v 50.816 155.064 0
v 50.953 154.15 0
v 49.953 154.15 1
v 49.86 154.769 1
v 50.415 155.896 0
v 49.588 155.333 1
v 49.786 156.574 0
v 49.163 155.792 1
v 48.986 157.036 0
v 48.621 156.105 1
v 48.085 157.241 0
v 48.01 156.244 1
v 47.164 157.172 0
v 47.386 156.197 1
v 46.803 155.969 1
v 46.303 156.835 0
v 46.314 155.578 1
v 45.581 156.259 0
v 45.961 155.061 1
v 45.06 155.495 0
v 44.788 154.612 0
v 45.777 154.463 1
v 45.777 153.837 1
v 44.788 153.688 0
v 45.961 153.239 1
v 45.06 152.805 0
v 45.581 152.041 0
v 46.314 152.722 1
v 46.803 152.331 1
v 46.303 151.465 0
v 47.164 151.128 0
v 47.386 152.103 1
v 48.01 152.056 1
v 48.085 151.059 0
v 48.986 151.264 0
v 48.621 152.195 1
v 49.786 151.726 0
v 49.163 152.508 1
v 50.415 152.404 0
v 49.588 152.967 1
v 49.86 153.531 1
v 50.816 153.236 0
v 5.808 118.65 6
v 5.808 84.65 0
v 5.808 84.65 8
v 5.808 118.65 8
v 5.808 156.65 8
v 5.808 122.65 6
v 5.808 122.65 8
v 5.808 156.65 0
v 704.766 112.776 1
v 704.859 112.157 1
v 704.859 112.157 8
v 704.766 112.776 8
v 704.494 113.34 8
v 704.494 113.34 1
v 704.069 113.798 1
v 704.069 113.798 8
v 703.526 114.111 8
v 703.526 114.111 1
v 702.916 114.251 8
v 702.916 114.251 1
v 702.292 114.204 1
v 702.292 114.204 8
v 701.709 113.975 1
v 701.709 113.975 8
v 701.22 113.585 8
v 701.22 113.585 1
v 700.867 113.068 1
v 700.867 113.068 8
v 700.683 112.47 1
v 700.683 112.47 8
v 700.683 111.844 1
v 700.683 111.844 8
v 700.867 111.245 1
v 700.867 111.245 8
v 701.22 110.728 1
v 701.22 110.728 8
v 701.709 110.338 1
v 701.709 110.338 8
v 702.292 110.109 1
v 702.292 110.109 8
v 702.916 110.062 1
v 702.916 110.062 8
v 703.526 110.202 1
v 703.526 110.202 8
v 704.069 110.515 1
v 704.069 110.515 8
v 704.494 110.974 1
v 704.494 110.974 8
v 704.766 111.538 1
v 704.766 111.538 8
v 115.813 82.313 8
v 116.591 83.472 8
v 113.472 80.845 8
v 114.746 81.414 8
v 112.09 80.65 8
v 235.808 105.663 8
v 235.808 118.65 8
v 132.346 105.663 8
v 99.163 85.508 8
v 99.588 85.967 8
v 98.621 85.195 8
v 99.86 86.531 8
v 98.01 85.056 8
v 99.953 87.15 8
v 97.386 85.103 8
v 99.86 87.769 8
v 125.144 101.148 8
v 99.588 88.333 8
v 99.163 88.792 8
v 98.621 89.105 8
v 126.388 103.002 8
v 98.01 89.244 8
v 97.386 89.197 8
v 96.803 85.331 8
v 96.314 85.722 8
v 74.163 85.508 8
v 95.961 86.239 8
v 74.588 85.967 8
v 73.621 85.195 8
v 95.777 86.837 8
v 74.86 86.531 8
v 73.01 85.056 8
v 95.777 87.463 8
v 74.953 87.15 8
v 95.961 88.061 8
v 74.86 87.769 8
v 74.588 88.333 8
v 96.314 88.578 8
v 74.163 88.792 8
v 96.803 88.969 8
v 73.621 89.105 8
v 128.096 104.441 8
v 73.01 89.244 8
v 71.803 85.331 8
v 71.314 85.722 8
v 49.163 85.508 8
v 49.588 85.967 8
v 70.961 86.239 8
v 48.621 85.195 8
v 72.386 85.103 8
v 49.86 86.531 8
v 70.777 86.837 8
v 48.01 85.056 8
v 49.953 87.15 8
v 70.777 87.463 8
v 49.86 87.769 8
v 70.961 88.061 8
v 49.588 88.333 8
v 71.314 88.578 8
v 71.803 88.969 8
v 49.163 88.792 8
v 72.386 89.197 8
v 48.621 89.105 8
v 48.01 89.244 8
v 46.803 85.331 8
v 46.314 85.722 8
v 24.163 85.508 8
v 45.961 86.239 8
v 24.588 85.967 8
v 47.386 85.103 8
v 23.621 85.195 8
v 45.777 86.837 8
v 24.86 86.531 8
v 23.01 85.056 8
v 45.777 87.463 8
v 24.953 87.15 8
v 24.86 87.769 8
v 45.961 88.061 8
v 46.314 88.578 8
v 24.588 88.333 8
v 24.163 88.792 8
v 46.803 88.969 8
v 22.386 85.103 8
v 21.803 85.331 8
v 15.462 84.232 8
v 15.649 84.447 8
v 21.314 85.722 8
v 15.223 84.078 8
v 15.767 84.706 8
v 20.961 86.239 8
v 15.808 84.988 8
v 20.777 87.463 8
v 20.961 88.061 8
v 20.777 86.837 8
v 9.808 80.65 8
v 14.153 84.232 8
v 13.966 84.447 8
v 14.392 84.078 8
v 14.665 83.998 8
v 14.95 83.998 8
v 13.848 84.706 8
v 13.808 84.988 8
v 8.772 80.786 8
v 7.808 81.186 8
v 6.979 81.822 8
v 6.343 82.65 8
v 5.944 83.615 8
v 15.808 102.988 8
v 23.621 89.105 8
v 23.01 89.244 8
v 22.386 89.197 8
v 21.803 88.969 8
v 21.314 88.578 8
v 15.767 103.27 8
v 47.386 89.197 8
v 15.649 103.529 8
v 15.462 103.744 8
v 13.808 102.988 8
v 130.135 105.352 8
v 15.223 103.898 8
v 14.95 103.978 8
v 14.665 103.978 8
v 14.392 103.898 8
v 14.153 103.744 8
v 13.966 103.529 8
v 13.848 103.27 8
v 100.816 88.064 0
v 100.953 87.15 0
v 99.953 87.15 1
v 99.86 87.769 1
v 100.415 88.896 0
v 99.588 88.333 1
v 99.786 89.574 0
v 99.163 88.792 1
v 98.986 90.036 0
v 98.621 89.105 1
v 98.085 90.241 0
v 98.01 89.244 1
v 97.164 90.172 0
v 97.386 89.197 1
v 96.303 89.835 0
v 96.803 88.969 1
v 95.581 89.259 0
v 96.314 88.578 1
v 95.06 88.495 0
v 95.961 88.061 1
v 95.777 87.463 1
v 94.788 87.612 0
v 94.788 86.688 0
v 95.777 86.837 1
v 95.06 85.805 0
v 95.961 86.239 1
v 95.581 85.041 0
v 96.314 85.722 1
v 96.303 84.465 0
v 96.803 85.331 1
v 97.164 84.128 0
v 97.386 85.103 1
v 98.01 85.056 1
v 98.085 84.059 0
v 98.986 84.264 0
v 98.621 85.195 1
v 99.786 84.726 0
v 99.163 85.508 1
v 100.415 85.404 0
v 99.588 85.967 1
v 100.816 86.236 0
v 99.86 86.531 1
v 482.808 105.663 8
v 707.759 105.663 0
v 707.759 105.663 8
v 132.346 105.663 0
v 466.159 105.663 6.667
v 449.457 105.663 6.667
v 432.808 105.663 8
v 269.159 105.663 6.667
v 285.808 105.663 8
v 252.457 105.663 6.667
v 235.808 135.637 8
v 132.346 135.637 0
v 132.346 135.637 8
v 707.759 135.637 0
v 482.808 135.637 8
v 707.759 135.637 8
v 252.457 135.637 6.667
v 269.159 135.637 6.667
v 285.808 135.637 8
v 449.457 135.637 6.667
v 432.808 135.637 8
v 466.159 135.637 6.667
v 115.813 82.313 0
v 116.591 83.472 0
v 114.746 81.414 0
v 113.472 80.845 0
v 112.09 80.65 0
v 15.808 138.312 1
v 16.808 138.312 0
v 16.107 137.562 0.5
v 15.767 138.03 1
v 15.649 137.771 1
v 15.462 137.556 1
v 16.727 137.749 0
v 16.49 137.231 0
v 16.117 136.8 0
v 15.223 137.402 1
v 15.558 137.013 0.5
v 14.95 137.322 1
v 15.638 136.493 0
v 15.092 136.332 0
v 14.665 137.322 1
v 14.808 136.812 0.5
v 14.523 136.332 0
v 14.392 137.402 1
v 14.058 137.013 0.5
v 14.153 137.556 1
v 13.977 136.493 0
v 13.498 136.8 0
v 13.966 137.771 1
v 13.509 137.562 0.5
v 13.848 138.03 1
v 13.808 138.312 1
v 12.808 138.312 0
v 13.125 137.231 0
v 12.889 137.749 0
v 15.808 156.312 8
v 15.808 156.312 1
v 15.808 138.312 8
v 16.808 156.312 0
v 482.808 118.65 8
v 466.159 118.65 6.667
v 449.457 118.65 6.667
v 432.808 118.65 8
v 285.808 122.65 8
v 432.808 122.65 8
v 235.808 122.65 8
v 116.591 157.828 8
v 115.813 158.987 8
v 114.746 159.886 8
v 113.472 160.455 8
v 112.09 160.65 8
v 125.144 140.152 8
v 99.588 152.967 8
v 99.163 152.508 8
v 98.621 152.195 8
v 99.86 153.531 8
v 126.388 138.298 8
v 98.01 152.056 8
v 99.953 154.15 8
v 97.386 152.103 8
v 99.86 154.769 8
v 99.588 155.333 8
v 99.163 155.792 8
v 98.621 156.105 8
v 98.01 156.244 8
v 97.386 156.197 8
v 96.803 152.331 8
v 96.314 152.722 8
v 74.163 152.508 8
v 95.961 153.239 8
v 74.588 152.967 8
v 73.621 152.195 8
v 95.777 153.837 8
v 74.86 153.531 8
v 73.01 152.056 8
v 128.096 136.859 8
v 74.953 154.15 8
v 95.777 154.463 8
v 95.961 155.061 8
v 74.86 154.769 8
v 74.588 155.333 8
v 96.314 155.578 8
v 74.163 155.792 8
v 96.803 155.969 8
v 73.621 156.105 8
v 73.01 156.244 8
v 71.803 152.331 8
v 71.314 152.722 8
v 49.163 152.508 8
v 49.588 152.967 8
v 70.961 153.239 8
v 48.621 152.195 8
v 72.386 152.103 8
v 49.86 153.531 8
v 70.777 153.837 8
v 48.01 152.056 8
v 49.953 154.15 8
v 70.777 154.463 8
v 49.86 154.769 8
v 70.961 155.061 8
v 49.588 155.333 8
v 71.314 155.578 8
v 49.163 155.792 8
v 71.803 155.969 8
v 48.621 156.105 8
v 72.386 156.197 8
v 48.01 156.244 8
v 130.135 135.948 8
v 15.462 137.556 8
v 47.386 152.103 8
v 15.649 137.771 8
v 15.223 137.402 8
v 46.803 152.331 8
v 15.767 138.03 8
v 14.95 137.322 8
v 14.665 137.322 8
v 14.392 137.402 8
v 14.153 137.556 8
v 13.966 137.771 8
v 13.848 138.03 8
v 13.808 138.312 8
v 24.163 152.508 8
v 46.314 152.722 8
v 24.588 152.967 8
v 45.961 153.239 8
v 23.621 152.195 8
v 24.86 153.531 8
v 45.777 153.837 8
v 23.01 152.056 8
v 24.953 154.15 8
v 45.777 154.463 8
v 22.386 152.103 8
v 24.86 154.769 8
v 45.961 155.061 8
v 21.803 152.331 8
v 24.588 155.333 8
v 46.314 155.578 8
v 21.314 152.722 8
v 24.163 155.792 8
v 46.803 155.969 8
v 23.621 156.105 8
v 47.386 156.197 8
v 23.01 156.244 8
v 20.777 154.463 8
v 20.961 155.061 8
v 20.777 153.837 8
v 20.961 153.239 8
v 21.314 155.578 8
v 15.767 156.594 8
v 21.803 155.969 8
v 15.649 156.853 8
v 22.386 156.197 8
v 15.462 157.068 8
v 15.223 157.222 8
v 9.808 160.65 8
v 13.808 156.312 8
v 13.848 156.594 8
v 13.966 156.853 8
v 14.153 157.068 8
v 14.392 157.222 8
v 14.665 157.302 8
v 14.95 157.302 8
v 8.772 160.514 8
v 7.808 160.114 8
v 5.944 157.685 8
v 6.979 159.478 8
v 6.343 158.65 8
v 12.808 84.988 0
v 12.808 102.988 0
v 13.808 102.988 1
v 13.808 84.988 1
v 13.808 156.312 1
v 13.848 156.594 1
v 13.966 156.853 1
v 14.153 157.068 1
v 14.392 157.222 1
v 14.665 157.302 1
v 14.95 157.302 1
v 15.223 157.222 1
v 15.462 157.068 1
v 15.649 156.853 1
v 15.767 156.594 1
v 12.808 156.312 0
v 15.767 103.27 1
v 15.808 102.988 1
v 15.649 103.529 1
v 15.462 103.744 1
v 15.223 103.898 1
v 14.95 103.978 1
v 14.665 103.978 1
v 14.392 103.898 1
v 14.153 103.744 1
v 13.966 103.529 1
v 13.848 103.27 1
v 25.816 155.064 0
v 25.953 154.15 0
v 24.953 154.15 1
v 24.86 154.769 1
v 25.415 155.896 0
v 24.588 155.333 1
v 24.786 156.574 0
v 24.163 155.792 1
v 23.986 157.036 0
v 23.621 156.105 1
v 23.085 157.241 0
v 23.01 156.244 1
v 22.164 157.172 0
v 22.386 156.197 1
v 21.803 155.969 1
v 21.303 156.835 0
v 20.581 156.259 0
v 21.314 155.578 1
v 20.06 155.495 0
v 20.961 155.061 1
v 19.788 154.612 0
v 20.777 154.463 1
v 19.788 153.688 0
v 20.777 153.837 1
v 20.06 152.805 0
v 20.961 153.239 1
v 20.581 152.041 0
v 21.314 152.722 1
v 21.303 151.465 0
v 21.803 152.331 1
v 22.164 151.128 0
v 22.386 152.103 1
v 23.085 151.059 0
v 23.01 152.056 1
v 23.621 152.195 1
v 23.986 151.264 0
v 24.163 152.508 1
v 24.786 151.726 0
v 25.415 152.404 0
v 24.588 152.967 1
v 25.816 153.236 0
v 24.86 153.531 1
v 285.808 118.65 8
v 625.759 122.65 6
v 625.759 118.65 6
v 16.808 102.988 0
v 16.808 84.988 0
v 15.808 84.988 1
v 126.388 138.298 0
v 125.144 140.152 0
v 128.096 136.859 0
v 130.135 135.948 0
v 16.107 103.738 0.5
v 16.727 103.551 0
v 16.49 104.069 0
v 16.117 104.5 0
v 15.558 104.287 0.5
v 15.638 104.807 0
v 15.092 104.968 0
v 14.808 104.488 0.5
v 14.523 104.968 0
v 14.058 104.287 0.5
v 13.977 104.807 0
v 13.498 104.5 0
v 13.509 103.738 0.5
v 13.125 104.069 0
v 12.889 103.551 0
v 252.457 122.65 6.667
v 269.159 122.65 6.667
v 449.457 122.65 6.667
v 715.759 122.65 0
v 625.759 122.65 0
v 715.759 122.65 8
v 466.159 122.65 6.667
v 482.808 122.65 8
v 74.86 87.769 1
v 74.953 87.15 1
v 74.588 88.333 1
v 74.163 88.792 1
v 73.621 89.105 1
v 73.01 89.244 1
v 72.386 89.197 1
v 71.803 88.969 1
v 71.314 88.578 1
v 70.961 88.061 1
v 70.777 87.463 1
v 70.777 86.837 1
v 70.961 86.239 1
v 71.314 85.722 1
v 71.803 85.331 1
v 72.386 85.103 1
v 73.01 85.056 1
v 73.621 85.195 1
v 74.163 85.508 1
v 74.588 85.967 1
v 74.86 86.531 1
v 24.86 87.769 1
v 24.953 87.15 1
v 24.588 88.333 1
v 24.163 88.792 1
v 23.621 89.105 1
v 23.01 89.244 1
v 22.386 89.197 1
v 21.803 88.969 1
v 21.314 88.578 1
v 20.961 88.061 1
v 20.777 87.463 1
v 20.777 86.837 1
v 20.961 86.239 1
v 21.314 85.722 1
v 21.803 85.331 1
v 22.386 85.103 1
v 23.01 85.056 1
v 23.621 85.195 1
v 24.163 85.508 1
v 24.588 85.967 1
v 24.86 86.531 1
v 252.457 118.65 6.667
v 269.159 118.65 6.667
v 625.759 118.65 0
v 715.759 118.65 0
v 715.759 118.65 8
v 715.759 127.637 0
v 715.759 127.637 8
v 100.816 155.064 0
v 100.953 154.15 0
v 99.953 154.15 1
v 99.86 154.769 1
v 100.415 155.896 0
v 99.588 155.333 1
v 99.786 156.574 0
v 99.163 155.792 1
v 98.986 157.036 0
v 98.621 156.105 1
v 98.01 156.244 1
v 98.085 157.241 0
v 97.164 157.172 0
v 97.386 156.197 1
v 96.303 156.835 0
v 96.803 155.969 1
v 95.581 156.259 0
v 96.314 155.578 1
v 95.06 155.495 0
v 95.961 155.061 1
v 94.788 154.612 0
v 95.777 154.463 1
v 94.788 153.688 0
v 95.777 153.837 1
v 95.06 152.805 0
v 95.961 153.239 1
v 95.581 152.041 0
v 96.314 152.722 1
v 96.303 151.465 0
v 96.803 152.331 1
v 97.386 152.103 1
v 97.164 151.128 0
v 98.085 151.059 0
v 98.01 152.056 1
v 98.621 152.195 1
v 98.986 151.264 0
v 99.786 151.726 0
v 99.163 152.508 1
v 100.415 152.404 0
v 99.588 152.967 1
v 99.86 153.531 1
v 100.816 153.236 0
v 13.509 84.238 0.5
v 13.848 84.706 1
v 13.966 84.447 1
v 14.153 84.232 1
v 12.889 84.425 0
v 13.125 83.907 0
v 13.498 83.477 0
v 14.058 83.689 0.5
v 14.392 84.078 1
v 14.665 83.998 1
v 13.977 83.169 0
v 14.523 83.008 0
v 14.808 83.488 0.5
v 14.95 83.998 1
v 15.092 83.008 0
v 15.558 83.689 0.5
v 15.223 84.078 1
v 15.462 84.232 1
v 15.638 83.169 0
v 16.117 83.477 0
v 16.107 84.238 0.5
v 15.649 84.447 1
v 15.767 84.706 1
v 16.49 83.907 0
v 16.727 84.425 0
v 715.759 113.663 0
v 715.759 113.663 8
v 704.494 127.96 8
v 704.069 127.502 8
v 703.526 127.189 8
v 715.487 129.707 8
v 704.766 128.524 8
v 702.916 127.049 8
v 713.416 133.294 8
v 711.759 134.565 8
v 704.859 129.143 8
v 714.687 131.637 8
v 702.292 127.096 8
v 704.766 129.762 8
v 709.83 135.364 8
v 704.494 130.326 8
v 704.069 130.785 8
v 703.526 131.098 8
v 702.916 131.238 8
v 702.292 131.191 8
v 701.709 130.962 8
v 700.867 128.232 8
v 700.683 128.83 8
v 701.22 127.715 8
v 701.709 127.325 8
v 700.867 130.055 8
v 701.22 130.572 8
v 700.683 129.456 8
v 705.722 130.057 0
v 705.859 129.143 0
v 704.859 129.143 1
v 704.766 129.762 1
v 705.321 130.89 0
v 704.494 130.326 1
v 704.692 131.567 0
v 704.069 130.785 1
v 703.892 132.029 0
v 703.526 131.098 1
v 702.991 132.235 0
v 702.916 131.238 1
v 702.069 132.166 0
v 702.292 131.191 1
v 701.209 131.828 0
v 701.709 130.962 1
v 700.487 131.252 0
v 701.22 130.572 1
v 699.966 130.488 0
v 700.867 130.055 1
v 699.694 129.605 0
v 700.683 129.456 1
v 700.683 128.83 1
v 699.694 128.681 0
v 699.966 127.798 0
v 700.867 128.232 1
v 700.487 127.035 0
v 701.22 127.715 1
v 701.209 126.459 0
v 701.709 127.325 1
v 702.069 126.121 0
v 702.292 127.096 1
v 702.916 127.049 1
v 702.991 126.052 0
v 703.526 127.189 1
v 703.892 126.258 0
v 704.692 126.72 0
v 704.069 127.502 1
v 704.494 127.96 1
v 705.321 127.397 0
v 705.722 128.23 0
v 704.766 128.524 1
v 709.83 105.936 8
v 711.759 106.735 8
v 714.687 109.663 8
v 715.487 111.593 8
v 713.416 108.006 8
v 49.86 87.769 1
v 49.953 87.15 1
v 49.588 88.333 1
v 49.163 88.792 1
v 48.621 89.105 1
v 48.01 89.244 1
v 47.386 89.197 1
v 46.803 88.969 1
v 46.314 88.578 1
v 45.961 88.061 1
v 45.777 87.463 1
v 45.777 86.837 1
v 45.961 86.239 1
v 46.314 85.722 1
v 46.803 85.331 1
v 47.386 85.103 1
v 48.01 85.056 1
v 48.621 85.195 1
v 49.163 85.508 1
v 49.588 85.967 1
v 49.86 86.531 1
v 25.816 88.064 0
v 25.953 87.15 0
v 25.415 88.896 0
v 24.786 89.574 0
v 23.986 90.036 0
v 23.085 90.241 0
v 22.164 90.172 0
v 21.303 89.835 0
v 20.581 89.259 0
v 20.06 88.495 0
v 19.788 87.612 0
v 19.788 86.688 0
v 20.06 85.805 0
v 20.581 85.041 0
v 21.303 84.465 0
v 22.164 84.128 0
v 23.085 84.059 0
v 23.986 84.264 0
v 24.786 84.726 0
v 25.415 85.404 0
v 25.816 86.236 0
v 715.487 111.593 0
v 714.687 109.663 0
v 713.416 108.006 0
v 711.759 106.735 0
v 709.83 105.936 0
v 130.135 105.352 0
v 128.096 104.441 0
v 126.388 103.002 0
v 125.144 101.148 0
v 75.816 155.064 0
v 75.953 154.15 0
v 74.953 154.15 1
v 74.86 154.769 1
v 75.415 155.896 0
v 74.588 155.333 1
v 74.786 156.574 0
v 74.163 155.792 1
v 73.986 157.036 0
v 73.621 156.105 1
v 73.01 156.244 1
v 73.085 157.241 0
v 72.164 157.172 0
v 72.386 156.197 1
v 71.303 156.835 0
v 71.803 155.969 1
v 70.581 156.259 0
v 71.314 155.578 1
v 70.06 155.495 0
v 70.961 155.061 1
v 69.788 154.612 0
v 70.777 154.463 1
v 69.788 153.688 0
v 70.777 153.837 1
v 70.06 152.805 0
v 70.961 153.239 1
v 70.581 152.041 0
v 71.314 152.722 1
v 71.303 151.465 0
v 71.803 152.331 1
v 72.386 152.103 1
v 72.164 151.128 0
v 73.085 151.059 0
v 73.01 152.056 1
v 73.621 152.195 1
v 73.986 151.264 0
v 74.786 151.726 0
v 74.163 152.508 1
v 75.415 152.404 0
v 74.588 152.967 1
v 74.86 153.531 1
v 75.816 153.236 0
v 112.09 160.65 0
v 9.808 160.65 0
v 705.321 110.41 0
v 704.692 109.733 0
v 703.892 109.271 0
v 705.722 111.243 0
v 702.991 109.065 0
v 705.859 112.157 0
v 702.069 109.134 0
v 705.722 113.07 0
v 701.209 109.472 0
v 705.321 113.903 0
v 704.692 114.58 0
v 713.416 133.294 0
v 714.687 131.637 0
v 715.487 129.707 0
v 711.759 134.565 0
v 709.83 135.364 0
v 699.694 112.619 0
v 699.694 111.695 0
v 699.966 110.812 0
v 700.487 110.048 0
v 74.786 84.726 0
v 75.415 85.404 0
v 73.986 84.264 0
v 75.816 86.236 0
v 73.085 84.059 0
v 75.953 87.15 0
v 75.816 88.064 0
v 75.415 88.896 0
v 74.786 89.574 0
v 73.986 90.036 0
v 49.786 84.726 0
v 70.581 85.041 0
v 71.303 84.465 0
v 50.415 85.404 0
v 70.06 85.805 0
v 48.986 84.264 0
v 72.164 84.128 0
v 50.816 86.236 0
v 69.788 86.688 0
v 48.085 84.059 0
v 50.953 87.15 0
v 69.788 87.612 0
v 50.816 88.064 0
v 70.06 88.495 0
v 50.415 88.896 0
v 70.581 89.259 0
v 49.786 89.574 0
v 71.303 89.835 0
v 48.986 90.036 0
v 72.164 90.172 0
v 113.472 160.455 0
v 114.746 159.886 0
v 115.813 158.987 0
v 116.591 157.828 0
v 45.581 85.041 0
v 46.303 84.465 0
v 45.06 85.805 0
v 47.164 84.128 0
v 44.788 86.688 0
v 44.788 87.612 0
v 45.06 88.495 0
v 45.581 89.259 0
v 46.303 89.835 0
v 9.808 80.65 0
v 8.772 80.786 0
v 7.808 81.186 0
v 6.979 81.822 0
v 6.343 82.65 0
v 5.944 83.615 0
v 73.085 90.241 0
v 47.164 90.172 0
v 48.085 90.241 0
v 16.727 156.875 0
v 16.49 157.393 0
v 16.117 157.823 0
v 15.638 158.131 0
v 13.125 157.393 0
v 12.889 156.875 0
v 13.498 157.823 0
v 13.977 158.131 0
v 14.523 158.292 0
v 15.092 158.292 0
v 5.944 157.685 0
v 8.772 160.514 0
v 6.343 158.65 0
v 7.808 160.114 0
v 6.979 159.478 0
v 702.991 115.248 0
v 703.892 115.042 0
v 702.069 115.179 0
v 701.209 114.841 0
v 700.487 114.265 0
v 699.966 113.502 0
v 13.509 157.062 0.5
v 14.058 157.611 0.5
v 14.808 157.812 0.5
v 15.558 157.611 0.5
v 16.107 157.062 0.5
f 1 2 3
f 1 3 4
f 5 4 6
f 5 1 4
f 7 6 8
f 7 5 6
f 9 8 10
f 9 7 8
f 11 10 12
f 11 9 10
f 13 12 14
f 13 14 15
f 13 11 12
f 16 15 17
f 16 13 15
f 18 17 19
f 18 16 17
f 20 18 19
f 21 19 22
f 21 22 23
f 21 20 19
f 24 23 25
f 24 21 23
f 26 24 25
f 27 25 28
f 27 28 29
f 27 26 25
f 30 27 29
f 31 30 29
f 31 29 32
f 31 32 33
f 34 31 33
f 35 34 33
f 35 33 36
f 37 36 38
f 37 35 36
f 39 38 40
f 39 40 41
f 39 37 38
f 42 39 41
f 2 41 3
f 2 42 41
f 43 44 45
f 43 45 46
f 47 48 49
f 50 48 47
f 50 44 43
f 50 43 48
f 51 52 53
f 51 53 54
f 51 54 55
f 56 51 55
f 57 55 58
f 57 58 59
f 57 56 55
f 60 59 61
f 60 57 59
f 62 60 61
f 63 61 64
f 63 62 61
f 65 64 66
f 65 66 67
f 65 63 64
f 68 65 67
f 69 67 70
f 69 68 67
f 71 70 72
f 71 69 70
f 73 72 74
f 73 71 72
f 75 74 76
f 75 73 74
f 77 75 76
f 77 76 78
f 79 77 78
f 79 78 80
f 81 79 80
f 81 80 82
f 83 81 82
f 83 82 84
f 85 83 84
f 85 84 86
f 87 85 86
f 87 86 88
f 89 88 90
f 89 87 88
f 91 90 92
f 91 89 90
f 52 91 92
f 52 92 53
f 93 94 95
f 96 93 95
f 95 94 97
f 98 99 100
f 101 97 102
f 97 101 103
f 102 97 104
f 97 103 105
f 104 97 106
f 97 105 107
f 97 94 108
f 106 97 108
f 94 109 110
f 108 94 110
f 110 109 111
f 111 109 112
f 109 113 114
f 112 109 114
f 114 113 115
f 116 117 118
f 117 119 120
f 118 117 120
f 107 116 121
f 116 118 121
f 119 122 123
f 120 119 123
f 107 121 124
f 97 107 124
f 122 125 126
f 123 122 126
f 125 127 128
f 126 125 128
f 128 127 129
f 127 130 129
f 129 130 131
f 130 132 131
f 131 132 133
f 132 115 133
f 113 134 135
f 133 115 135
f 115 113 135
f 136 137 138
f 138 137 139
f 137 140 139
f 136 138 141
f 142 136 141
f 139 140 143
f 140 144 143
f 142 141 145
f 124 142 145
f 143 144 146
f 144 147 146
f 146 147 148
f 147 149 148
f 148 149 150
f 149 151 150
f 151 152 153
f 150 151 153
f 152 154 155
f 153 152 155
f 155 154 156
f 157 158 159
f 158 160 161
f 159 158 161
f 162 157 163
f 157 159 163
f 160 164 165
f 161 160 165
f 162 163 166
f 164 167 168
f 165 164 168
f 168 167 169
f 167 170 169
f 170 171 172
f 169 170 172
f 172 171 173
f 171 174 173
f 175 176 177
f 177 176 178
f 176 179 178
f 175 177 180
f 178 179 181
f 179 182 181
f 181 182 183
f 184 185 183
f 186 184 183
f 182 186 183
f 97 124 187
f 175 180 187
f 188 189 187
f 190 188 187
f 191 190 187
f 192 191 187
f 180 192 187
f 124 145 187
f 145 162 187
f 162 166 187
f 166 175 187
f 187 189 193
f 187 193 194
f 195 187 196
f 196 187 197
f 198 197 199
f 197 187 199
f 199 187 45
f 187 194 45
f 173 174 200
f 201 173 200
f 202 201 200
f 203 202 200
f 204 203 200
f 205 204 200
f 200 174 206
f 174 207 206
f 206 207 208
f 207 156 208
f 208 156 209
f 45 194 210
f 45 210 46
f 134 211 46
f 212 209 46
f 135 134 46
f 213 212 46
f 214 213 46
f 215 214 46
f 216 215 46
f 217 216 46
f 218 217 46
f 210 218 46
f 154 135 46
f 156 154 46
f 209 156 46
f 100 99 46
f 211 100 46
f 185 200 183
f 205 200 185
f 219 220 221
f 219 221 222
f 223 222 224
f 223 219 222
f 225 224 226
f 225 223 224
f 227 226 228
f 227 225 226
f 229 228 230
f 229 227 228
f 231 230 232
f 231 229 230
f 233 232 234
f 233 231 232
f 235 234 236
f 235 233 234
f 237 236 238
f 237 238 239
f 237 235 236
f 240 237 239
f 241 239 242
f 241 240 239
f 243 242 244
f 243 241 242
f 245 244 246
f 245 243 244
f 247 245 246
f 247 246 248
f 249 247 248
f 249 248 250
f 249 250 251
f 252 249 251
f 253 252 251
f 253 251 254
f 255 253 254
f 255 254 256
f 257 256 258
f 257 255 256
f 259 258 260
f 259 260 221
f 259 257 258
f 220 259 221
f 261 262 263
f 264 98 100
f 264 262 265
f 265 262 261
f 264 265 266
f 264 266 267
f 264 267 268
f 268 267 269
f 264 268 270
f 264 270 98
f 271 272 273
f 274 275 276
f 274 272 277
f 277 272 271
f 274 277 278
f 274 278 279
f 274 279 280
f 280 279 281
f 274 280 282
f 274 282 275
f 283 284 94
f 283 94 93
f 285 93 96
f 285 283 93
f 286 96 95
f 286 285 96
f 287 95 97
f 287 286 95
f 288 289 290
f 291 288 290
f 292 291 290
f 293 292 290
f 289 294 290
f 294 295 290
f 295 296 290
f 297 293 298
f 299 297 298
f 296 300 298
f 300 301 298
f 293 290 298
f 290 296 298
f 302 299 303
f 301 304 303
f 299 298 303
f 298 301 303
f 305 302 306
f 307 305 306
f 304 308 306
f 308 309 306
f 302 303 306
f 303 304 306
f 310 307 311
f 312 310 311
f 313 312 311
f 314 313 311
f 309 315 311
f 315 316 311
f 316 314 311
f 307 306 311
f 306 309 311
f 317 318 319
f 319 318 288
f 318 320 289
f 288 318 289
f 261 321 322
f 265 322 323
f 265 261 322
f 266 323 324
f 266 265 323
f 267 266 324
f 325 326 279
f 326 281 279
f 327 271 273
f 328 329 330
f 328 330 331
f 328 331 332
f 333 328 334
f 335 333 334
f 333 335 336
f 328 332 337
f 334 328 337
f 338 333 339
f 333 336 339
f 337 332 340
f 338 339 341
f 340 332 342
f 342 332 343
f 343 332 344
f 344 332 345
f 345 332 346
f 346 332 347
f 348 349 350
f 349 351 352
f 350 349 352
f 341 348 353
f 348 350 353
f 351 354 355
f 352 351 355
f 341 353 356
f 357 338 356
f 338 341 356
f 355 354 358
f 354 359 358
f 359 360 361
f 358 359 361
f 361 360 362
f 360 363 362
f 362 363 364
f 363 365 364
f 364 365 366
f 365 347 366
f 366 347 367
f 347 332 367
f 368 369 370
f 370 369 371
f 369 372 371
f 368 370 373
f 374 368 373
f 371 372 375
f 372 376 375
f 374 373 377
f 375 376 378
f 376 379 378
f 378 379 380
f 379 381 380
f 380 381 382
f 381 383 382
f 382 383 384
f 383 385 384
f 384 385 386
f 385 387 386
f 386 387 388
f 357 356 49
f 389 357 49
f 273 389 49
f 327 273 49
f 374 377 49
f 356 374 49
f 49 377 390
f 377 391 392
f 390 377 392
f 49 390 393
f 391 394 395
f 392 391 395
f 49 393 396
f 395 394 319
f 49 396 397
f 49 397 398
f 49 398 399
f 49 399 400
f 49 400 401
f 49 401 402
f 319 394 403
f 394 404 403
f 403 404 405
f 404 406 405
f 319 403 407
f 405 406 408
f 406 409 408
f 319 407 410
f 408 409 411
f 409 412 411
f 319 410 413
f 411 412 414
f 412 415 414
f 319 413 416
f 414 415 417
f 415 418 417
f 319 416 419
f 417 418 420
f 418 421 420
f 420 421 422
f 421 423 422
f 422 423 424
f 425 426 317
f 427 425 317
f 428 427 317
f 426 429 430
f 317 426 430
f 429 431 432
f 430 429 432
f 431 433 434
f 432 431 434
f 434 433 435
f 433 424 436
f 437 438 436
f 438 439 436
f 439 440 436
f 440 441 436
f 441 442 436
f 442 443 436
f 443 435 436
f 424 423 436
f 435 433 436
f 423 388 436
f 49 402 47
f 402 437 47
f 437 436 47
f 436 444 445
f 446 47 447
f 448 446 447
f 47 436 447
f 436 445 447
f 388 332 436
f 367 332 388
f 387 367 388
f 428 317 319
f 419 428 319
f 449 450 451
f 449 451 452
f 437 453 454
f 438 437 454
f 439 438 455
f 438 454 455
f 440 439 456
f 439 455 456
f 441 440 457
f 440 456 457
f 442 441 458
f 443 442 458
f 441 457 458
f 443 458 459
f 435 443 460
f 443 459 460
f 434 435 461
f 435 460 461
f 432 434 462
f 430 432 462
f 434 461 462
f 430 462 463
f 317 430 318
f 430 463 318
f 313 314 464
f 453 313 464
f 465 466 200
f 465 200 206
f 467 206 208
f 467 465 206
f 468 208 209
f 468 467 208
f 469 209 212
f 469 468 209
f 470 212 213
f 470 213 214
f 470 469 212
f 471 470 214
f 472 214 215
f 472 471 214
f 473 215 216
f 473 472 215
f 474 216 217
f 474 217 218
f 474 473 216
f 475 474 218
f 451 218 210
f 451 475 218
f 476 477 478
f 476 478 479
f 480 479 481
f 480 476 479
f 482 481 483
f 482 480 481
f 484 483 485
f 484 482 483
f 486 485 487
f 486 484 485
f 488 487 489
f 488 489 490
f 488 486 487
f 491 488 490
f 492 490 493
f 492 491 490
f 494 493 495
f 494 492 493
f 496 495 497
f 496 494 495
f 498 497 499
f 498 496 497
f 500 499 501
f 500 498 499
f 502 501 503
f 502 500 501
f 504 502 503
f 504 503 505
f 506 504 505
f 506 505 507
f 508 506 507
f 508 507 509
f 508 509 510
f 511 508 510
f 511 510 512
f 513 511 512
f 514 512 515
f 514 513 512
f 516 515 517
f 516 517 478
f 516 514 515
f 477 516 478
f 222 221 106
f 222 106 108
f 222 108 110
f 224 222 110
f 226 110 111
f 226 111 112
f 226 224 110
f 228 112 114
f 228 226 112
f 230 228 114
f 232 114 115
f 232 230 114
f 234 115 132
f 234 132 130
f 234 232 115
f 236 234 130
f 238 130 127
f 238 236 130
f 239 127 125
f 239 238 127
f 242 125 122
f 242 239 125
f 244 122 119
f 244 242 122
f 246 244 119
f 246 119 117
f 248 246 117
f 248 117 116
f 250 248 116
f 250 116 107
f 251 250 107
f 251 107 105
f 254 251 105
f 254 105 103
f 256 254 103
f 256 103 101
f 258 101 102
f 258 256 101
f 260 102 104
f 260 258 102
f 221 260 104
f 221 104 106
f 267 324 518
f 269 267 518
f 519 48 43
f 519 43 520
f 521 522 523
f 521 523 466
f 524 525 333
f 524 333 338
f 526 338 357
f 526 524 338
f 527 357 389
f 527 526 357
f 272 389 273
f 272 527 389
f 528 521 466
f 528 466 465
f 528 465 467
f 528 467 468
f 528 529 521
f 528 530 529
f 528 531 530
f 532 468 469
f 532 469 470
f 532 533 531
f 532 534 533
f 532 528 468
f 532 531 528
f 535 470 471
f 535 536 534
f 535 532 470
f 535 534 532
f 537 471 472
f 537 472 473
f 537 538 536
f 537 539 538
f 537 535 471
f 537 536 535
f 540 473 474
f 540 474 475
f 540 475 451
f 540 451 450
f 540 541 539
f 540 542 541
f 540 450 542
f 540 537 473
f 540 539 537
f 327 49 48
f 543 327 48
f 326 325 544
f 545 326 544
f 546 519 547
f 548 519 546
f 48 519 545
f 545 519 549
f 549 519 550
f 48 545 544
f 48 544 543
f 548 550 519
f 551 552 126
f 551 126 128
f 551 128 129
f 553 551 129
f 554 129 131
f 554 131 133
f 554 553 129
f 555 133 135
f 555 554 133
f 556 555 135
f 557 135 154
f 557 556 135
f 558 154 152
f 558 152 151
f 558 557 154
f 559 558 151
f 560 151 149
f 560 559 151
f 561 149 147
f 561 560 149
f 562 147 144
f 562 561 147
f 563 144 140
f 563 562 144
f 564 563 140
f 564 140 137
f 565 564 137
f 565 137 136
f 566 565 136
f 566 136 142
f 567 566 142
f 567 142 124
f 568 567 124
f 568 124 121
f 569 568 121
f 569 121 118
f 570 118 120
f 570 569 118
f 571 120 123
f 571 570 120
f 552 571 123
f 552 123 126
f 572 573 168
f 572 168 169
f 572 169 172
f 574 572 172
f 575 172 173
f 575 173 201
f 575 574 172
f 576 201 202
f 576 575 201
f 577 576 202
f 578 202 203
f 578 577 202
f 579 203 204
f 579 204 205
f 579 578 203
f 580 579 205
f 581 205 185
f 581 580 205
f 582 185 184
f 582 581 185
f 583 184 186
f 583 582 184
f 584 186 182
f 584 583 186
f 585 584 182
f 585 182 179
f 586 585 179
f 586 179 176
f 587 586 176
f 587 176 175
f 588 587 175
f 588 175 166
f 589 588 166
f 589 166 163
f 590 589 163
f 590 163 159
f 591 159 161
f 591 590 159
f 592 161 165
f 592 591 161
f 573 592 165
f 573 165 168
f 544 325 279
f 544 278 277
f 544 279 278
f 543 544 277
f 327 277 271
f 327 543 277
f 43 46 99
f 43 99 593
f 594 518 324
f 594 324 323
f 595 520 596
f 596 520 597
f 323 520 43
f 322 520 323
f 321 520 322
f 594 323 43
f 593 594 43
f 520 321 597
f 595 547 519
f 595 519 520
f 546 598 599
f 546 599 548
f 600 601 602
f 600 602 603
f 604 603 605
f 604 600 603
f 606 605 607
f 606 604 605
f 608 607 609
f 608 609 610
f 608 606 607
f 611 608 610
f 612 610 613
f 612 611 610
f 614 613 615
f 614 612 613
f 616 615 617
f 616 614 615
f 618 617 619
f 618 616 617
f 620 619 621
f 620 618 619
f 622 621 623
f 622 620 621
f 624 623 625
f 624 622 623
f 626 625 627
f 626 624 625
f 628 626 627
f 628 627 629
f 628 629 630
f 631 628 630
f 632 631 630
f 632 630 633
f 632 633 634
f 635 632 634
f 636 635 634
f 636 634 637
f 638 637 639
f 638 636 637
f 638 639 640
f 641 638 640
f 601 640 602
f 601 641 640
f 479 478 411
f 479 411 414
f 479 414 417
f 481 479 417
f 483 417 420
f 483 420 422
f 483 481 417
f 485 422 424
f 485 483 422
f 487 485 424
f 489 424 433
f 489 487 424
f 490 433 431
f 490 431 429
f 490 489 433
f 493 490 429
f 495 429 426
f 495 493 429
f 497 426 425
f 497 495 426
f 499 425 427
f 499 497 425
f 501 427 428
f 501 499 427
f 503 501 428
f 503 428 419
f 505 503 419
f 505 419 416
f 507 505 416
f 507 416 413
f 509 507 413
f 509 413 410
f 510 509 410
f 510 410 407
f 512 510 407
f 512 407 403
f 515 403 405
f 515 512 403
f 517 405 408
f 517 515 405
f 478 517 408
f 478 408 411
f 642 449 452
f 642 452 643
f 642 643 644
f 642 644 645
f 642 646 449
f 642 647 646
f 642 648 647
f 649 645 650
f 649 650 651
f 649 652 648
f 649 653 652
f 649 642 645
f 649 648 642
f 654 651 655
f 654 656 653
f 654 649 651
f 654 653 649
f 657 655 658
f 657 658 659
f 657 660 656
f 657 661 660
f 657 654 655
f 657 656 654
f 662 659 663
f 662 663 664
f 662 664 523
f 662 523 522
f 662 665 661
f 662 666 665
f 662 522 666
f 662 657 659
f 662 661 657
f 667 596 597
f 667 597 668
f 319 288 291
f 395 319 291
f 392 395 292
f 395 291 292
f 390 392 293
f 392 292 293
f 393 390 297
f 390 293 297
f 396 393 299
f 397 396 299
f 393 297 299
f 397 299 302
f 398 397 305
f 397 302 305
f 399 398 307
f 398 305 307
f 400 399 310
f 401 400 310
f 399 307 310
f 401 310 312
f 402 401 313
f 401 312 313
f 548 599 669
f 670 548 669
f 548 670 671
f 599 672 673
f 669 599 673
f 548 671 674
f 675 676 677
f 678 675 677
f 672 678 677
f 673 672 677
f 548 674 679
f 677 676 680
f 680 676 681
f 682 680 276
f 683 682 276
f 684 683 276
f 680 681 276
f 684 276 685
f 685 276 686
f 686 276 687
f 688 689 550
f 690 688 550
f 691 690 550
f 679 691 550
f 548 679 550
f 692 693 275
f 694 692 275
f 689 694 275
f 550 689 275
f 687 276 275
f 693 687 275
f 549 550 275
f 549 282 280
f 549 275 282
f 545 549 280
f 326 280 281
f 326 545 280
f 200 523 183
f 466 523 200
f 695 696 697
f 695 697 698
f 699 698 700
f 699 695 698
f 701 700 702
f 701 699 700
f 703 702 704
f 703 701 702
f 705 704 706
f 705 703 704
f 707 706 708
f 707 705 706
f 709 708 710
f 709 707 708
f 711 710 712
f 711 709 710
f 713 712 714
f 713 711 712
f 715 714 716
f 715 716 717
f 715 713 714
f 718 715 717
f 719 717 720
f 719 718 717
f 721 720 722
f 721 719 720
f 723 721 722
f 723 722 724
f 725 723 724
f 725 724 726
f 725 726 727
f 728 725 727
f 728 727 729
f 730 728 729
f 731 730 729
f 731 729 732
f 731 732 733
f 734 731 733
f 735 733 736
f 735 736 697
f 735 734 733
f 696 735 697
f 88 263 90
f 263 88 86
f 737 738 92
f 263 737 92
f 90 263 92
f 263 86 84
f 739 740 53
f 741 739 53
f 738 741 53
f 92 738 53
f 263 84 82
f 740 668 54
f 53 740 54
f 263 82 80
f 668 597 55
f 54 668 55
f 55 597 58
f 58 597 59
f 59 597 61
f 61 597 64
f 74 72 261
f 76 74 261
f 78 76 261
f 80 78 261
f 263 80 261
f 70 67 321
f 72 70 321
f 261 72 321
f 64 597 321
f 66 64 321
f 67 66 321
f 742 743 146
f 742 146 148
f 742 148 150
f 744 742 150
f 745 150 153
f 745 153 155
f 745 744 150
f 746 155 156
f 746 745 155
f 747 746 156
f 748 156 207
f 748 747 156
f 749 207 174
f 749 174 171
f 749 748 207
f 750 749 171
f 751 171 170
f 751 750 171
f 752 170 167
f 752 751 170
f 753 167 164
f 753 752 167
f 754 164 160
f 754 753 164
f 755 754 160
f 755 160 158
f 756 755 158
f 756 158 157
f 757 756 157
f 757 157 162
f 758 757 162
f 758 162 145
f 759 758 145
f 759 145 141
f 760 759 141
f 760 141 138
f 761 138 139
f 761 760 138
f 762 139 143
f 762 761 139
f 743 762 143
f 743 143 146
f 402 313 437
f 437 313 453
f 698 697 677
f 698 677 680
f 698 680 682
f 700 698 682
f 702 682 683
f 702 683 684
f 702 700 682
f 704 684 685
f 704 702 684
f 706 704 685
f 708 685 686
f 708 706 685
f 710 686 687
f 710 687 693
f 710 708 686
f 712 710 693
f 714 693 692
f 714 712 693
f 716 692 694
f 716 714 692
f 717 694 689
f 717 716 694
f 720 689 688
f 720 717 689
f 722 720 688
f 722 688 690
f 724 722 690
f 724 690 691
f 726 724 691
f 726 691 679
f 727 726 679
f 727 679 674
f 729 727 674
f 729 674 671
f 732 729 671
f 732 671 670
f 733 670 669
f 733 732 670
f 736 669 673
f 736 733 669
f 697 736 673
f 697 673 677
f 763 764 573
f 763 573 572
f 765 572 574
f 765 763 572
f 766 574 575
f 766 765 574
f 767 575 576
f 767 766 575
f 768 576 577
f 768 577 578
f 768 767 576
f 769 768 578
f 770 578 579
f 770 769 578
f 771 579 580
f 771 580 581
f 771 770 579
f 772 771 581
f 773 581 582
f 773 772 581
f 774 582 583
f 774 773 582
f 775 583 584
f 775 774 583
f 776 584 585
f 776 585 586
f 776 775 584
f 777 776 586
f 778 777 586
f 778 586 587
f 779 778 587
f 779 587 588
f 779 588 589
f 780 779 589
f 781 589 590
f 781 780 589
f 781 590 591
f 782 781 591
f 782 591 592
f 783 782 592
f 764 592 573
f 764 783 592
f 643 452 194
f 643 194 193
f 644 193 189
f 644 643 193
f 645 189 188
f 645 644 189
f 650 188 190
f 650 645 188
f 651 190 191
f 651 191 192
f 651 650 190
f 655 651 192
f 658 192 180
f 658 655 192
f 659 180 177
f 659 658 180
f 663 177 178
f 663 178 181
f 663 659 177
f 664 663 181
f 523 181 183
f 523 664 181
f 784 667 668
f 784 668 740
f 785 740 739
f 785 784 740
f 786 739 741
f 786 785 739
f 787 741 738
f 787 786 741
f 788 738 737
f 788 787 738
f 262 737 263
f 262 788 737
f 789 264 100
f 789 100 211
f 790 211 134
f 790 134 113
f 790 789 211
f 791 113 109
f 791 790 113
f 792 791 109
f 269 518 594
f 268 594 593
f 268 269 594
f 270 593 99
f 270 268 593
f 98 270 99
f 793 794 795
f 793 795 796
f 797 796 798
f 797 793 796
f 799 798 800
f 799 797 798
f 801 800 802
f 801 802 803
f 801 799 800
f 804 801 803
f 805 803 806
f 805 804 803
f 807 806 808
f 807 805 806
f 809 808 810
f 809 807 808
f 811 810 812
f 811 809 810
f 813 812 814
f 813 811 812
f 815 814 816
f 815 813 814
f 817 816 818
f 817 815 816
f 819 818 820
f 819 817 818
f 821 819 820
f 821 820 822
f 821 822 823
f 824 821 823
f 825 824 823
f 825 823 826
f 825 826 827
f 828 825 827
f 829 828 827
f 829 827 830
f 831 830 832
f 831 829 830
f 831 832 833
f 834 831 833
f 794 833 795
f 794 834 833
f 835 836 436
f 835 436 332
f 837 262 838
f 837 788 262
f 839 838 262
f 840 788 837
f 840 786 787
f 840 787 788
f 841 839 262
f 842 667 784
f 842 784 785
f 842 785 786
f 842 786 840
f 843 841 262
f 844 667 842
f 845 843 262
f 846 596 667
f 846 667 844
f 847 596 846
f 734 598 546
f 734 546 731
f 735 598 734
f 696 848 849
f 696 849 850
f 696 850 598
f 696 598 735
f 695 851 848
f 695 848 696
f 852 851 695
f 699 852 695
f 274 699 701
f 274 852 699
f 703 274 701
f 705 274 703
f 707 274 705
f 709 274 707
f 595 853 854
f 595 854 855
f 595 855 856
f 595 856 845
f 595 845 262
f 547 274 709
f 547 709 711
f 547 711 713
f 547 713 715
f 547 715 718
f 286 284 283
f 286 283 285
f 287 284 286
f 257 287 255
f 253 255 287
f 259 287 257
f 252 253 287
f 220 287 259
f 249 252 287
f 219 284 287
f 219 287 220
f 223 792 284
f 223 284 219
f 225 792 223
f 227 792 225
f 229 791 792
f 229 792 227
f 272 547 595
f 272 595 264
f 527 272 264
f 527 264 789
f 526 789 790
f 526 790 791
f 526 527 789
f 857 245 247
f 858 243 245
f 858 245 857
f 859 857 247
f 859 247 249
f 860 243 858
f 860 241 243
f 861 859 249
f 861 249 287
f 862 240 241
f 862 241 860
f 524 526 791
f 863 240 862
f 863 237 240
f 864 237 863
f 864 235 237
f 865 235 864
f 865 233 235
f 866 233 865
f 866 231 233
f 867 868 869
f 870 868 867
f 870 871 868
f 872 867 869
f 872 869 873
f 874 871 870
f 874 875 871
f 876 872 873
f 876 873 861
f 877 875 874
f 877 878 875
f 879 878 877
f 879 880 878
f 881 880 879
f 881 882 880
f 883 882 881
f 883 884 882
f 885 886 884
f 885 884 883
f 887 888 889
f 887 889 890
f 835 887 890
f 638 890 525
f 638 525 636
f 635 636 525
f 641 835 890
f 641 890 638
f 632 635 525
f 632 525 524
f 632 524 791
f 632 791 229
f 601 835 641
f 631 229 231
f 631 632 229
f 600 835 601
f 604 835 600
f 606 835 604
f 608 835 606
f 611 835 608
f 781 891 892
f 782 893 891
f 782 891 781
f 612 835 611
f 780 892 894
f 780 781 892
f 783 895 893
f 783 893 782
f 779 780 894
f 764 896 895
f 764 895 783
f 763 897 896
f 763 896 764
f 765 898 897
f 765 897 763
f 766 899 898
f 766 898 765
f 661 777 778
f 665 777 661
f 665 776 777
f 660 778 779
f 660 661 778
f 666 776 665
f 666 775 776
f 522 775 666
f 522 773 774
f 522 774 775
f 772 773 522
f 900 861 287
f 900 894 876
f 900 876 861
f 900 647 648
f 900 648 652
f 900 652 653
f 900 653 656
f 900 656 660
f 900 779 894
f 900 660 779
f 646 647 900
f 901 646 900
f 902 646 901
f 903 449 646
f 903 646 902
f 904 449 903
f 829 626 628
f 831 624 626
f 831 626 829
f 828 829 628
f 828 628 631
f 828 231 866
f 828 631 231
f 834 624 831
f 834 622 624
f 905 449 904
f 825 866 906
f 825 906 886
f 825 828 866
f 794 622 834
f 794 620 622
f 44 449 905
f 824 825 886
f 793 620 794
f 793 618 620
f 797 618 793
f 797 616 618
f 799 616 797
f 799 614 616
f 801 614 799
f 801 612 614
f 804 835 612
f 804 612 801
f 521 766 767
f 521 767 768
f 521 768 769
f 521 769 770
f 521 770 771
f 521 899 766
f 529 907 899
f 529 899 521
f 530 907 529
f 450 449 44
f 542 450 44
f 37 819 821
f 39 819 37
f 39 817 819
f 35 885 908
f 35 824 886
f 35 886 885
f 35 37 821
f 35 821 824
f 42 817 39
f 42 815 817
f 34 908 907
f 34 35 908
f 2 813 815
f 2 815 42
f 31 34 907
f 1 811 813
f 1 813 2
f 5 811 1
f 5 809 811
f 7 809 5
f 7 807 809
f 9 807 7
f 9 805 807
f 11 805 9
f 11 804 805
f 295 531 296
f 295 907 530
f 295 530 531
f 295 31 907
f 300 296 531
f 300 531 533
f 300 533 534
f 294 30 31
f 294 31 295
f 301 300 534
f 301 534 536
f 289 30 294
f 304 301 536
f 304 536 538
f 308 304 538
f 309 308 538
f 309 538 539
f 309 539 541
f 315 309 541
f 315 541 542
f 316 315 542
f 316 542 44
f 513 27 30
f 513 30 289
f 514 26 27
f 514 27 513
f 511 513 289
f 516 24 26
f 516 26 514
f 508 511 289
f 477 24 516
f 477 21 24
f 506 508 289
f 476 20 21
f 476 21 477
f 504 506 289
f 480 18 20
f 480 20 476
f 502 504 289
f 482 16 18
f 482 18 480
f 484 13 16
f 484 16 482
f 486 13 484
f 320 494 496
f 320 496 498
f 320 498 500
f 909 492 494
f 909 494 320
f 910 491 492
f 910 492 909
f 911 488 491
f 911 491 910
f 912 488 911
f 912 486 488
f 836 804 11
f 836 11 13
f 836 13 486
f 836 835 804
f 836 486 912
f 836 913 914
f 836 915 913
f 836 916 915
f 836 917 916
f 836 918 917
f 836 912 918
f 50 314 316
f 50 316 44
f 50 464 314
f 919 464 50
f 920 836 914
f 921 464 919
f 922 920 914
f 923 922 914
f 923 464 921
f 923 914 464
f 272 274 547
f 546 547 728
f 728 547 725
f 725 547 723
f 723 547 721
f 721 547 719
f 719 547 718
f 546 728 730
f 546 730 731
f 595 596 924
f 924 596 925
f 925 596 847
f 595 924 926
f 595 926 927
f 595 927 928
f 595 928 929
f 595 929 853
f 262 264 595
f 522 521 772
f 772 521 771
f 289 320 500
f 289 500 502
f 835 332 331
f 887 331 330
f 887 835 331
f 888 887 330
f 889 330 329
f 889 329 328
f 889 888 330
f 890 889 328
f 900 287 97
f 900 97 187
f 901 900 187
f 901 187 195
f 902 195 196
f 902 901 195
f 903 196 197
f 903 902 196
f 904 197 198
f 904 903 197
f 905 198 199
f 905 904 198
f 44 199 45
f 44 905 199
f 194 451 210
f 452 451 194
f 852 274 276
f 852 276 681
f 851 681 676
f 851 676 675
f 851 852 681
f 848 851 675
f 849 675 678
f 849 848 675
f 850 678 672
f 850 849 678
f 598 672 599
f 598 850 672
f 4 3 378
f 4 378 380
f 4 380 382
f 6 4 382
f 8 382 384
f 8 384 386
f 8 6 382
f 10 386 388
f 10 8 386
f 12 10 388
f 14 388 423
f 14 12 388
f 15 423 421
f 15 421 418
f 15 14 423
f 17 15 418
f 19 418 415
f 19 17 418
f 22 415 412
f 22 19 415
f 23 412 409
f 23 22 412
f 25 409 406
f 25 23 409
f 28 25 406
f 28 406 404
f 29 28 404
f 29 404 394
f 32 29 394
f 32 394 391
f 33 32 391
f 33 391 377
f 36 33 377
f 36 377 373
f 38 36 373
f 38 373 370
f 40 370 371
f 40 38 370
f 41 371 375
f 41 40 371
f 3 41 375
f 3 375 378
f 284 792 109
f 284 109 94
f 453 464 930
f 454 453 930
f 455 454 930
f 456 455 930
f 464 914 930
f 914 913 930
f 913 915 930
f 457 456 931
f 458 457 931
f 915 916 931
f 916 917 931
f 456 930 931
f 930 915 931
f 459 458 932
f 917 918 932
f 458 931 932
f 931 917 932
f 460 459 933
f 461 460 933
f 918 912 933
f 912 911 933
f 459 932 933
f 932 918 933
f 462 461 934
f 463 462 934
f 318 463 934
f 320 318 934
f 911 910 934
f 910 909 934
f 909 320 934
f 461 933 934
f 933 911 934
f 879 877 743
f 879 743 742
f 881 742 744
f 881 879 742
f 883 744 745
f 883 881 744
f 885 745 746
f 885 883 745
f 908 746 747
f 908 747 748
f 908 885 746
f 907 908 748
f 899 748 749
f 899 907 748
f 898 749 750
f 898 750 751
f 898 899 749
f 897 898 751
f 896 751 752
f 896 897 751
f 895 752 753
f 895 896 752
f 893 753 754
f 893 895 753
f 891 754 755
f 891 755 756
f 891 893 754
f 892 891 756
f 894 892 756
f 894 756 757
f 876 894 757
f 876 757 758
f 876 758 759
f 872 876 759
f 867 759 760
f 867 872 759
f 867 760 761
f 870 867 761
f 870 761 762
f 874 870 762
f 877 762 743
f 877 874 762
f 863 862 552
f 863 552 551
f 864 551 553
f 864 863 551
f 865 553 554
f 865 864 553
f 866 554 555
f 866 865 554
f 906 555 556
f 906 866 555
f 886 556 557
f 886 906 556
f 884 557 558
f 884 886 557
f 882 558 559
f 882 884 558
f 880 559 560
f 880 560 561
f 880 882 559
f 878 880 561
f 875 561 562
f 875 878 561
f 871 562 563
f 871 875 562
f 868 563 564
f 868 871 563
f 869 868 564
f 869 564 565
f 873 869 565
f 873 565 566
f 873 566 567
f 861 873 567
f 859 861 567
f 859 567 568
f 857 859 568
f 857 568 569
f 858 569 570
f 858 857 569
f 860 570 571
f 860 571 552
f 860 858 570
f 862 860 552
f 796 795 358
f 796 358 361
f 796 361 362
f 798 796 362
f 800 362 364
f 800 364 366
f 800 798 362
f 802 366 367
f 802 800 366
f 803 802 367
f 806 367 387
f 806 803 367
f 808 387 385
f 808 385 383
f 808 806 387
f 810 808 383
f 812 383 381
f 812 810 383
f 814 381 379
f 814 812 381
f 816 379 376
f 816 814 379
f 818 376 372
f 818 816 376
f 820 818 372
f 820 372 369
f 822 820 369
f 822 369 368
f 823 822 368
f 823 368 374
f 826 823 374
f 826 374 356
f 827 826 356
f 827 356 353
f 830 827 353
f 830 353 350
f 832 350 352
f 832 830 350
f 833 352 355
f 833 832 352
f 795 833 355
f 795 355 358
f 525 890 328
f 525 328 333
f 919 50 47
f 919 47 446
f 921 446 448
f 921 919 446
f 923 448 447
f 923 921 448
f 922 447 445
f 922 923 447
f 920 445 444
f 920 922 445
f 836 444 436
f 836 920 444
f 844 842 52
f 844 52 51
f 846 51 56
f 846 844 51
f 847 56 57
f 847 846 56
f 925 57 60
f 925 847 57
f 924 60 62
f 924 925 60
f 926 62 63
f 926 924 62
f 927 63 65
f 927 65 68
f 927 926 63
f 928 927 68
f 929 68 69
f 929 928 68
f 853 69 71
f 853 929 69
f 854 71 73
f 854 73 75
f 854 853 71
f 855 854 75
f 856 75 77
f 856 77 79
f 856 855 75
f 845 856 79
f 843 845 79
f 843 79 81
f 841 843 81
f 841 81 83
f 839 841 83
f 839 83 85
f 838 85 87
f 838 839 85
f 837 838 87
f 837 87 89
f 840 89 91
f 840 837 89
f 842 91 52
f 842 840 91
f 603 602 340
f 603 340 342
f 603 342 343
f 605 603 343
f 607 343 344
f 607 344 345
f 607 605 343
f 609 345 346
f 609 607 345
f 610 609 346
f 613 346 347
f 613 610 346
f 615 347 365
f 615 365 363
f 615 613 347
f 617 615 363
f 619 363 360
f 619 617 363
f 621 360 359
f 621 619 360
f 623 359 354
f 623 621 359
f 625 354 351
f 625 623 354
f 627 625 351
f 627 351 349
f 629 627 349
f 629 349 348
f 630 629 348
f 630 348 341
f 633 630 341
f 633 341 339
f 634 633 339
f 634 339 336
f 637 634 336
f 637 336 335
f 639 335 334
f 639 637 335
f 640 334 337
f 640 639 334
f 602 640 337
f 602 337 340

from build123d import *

# Parameters (mm, degrees)
MODEL_R                 = 2.1
BOSS_EXTRU_1_DEPTH      = 8
ESQUISSE2_W             = 619.951628201
ESQUISSE2_H             = 4
ENL_V_MAT_EXTRU_1_DEPTH = 2
CHANFREIN1_SIZE         = 1
ENL_V_MAT_EXTRU_2_DEPTH = 55.986789313


with BuildPart() as part:
    # Model → Boss.-Extru.1 (new body)
    with BuildSketch(Plane.XY):
        with BuildLine():
            Line((5.807601336, 84.65), (5.807601336, 156.65))
            ThreePointArc((5.807601336, 156.65), (6.979174211, 159.478427125), (9.807601336, 160.65))
            Line((9.807601336, 160.65), (112.089987365, 160.65))
            ThreePointArc((112.089987365, 160.65), (114.746116476, 159.886151336), (116.590693318, 157.827991258))
            Line((116.590693318, 157.827991258), (125.144495245, 140.1520033))
            ThreePointArc((125.144495245, 140.1520033), (128.095818192, 136.858947175), (132.34562477, 135.636789313))
            Line((132.34562477, 135.636789313), (707.759229537, 135.636789313))
            ThreePointArc((707.759229537, 135.636789313), (713.416083787, 133.293643563), (715.759229537, 127.636789313))
            Line((715.759229537, 127.636789313), (715.759229537, 122.65))
            Line((715.759229537, 122.65), (625.759229537, 122.65))
            Line((625.759229537, 122.65), (625.759229537, 118.65))
            Line((625.759229537, 118.65), (715.759229537, 118.65))
            Line((715.759229537, 118.65), (715.759229537, 113.663210687))
            ThreePointArc((715.759229537, 113.663210687), (713.416083787, 108.006356437), (707.759229537, 105.663210687))
            Line((707.759229537, 105.663210687), (132.34562477, 105.663210687))
            ThreePointArc((132.34562477, 105.663210687), (128.095818192, 104.441052825), (125.144495245, 101.1479967))
            Line((125.144495245, 101.1479967), (116.590693318, 83.472008742))
            ThreePointArc((116.590693318, 83.472008742), (114.746116476, 81.413848664), (112.089987365, 80.65))
            Line((112.089987365, 80.65), (9.807601336, 80.65))
            ThreePointArc((9.807601336, 80.65), (6.979174211, 81.821572875), (5.807601336, 84.65))
        make_face()
        with Locations((702.759229537, 129.143394657)):
            Circle(MODEL_R, mode=Mode.SUBTRACT)
        with Locations((702.759229537, 112.156605343)):
            Circle(MODEL_R, mode=Mode.SUBTRACT)
        with Locations((47.853374331, 154.15)):
            Circle(MODEL_R, mode=Mode.SUBTRACT)
        with Locations((97.853374331, 154.15)):
            Circle(MODEL_R, mode=Mode.SUBTRACT)
        with Locations((22.853374331, 154.15)):
            Circle(MODEL_R, mode=Mode.SUBTRACT)
        with Locations((72.853374331, 154.15)):
            Circle(MODEL_R, mode=Mode.SUBTRACT)
        with Locations((47.853374331, 87.15)):
            Circle(MODEL_R, mode=Mode.SUBTRACT)
        with Locations((97.853374331, 87.15)):
            Circle(MODEL_R, mode=Mode.SUBTRACT)
        with Locations((22.853374331, 87.15)):
            Circle(MODEL_R, mode=Mode.SUBTRACT)
        with Locations((72.853374331, 87.15)):
            Circle(MODEL_R, mode=Mode.SUBTRACT)
        with BuildLine():
            Line((15.807601336, 84.988017314), (15.807601336, 102.988017314))
            ThreePointArc((15.807601336, 102.988017314), (14.807601336, 103.988017314), (13.807601336, 102.988017314))
            Line((13.807601336, 102.988017314), (13.807601336, 84.988017314))
            ThreePointArc((13.807601336, 84.988017314), (14.807601336, 83.988017314), (15.807601336, 84.988017314))
        make_face(mode=Mode.SUBTRACT)
        with BuildLine():
            Line((15.807601336, 156.311982686), (15.807601336, 138.311982686))
            ThreePointArc((15.807601336, 138.311982686), (14.807601336, 137.311982686), (13.807601336, 138.311982686))
            Line((13.807601336, 138.311982686), (13.807601336, 156.311982686))
            ThreePointArc((13.807601336, 156.311982686), (14.807601336, 157.311982686), (15.807601336, 156.311982686))
        make_face(mode=Mode.SUBTRACT)
    extrude(amount=BOSS_EXTRU_1_DEPTH)

    # Esquisse2 → Enlèv. mat.-Extru.1 (cut)
    with BuildSketch(Plane.XY.offset(8)):
        with Locations((315.783415436, 120.65)):
            Rectangle(ESQUISSE2_W, ESQUISSE2_H)
    extrude(amount=-ENL_V_MAT_EXTRU_1_DEPTH, mode=Mode.SUBTRACT)

    # Chanfrein1
    chanfrein1_edges = [part.edges().sort_by_distance(p)[0] for p in [
        (14.807601336, 103.988017314, 0),
        (13.807601336, 93.988017314, 0),
        (14.807601336, 83.988017314, 0),
        (15.807601336, 93.988017314, 0),
        (700.659229537, 129.143394657, 0),
        (700.659229537, 112.156605343, 0),
        (45.753374331, 154.15, 0),
        (95.753374331, 154.15, 0),
        (20.753374331, 154.15, 0),
        (70.753374331, 154.15, 0),
        (45.753374331, 87.15, 0),
        (95.753374331, 87.15, 0),
        (20.753374331, 87.15, 0),
        (70.753374331, 87.15, 0),
        (14.807601336, 157.311982686, 0),
        (13.807601336, 147.311982686, 0),
        (14.807601336, 137.311982686, 0),
        (15.807601336, 147.311982686, 0),
    ]]
    chamfer(chanfrein1_edges, length=CHANFREIN1_SIZE)

    # Esquisse3 → Enlèv. mat.-Extru.2 (cut, through all)
    with BuildSketch(Plane.XZ.offset(-105.663210687)):
        with BuildLine():
            Line((235.807601336, 8), (285.807601336, 8))
            ThreePointArc((285.807601336, 8), (260.807601336, 6.5), (235.807601336, 8))
        make_face()
        with BuildLine():
            Line((432.807601336, 8), (482.807601336, 8))
            ThreePointArc((482.807601336, 8), (457.807601336, 6.5), (432.807601336, 8))
        make_face()
    extrude(amount=-ENL_V_MAT_EXTRU_2_DEPTH, mode=Mode.SUBTRACT)


solid = part.part
